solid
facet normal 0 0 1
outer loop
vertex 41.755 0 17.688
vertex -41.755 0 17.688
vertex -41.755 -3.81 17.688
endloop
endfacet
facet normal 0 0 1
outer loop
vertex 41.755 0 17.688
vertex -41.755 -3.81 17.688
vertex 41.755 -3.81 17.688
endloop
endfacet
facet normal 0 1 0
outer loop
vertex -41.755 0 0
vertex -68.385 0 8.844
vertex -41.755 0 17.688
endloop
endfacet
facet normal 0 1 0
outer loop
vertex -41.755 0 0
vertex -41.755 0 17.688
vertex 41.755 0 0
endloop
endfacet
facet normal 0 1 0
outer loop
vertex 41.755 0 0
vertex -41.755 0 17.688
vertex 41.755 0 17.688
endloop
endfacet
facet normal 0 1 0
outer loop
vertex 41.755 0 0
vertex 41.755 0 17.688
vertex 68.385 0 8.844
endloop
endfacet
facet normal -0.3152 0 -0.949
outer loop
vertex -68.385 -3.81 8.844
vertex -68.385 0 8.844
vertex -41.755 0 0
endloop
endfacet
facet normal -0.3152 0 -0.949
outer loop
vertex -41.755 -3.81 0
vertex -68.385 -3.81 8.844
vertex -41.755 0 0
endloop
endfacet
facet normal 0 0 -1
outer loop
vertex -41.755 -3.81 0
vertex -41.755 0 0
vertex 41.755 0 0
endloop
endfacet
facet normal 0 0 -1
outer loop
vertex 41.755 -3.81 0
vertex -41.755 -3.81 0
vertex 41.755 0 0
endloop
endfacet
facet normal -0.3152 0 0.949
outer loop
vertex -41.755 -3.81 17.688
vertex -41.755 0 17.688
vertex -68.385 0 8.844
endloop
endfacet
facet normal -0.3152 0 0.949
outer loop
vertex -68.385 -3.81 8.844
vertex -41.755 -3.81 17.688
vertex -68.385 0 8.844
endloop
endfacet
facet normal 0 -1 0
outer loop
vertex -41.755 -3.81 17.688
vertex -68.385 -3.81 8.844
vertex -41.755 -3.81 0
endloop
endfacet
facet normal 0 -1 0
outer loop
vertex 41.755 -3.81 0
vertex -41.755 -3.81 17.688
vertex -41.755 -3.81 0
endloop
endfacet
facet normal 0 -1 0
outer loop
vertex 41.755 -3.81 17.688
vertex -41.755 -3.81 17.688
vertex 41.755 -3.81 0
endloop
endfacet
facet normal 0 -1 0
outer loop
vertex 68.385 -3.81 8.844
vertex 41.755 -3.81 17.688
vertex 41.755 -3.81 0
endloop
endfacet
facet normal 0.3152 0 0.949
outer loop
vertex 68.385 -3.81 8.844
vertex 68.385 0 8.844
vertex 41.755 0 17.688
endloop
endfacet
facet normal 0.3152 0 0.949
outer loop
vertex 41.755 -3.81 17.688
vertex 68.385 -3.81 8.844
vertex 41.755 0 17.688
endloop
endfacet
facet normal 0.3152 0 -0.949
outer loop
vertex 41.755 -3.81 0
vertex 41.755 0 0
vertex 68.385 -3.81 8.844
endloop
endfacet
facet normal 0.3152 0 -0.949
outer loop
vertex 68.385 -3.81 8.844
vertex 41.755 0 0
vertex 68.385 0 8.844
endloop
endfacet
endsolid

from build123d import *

# Parameters (mm, degrees)
F0_W     = 83.50922
F0_H     = 17.687716
F1_DEPTH = 3.81


with BuildPart() as f1:
    # F0 (on Front) → F1 (new body)
    with BuildSketch(Plane.XZ):
        with Locations((0, 8.843858)):
            Rectangle(F0_W, F0_H)
        Polygon((41.75461, 17.687716), (41.75461, 0), (68.384546, 8.843858), align=None)
        Polygon((-68.384535, 8.843858), (-41.75461, 0), (-41.75461, 17.687716), align=None)
    extrude(amount=F1_DEPTH)


solid = f1.part
